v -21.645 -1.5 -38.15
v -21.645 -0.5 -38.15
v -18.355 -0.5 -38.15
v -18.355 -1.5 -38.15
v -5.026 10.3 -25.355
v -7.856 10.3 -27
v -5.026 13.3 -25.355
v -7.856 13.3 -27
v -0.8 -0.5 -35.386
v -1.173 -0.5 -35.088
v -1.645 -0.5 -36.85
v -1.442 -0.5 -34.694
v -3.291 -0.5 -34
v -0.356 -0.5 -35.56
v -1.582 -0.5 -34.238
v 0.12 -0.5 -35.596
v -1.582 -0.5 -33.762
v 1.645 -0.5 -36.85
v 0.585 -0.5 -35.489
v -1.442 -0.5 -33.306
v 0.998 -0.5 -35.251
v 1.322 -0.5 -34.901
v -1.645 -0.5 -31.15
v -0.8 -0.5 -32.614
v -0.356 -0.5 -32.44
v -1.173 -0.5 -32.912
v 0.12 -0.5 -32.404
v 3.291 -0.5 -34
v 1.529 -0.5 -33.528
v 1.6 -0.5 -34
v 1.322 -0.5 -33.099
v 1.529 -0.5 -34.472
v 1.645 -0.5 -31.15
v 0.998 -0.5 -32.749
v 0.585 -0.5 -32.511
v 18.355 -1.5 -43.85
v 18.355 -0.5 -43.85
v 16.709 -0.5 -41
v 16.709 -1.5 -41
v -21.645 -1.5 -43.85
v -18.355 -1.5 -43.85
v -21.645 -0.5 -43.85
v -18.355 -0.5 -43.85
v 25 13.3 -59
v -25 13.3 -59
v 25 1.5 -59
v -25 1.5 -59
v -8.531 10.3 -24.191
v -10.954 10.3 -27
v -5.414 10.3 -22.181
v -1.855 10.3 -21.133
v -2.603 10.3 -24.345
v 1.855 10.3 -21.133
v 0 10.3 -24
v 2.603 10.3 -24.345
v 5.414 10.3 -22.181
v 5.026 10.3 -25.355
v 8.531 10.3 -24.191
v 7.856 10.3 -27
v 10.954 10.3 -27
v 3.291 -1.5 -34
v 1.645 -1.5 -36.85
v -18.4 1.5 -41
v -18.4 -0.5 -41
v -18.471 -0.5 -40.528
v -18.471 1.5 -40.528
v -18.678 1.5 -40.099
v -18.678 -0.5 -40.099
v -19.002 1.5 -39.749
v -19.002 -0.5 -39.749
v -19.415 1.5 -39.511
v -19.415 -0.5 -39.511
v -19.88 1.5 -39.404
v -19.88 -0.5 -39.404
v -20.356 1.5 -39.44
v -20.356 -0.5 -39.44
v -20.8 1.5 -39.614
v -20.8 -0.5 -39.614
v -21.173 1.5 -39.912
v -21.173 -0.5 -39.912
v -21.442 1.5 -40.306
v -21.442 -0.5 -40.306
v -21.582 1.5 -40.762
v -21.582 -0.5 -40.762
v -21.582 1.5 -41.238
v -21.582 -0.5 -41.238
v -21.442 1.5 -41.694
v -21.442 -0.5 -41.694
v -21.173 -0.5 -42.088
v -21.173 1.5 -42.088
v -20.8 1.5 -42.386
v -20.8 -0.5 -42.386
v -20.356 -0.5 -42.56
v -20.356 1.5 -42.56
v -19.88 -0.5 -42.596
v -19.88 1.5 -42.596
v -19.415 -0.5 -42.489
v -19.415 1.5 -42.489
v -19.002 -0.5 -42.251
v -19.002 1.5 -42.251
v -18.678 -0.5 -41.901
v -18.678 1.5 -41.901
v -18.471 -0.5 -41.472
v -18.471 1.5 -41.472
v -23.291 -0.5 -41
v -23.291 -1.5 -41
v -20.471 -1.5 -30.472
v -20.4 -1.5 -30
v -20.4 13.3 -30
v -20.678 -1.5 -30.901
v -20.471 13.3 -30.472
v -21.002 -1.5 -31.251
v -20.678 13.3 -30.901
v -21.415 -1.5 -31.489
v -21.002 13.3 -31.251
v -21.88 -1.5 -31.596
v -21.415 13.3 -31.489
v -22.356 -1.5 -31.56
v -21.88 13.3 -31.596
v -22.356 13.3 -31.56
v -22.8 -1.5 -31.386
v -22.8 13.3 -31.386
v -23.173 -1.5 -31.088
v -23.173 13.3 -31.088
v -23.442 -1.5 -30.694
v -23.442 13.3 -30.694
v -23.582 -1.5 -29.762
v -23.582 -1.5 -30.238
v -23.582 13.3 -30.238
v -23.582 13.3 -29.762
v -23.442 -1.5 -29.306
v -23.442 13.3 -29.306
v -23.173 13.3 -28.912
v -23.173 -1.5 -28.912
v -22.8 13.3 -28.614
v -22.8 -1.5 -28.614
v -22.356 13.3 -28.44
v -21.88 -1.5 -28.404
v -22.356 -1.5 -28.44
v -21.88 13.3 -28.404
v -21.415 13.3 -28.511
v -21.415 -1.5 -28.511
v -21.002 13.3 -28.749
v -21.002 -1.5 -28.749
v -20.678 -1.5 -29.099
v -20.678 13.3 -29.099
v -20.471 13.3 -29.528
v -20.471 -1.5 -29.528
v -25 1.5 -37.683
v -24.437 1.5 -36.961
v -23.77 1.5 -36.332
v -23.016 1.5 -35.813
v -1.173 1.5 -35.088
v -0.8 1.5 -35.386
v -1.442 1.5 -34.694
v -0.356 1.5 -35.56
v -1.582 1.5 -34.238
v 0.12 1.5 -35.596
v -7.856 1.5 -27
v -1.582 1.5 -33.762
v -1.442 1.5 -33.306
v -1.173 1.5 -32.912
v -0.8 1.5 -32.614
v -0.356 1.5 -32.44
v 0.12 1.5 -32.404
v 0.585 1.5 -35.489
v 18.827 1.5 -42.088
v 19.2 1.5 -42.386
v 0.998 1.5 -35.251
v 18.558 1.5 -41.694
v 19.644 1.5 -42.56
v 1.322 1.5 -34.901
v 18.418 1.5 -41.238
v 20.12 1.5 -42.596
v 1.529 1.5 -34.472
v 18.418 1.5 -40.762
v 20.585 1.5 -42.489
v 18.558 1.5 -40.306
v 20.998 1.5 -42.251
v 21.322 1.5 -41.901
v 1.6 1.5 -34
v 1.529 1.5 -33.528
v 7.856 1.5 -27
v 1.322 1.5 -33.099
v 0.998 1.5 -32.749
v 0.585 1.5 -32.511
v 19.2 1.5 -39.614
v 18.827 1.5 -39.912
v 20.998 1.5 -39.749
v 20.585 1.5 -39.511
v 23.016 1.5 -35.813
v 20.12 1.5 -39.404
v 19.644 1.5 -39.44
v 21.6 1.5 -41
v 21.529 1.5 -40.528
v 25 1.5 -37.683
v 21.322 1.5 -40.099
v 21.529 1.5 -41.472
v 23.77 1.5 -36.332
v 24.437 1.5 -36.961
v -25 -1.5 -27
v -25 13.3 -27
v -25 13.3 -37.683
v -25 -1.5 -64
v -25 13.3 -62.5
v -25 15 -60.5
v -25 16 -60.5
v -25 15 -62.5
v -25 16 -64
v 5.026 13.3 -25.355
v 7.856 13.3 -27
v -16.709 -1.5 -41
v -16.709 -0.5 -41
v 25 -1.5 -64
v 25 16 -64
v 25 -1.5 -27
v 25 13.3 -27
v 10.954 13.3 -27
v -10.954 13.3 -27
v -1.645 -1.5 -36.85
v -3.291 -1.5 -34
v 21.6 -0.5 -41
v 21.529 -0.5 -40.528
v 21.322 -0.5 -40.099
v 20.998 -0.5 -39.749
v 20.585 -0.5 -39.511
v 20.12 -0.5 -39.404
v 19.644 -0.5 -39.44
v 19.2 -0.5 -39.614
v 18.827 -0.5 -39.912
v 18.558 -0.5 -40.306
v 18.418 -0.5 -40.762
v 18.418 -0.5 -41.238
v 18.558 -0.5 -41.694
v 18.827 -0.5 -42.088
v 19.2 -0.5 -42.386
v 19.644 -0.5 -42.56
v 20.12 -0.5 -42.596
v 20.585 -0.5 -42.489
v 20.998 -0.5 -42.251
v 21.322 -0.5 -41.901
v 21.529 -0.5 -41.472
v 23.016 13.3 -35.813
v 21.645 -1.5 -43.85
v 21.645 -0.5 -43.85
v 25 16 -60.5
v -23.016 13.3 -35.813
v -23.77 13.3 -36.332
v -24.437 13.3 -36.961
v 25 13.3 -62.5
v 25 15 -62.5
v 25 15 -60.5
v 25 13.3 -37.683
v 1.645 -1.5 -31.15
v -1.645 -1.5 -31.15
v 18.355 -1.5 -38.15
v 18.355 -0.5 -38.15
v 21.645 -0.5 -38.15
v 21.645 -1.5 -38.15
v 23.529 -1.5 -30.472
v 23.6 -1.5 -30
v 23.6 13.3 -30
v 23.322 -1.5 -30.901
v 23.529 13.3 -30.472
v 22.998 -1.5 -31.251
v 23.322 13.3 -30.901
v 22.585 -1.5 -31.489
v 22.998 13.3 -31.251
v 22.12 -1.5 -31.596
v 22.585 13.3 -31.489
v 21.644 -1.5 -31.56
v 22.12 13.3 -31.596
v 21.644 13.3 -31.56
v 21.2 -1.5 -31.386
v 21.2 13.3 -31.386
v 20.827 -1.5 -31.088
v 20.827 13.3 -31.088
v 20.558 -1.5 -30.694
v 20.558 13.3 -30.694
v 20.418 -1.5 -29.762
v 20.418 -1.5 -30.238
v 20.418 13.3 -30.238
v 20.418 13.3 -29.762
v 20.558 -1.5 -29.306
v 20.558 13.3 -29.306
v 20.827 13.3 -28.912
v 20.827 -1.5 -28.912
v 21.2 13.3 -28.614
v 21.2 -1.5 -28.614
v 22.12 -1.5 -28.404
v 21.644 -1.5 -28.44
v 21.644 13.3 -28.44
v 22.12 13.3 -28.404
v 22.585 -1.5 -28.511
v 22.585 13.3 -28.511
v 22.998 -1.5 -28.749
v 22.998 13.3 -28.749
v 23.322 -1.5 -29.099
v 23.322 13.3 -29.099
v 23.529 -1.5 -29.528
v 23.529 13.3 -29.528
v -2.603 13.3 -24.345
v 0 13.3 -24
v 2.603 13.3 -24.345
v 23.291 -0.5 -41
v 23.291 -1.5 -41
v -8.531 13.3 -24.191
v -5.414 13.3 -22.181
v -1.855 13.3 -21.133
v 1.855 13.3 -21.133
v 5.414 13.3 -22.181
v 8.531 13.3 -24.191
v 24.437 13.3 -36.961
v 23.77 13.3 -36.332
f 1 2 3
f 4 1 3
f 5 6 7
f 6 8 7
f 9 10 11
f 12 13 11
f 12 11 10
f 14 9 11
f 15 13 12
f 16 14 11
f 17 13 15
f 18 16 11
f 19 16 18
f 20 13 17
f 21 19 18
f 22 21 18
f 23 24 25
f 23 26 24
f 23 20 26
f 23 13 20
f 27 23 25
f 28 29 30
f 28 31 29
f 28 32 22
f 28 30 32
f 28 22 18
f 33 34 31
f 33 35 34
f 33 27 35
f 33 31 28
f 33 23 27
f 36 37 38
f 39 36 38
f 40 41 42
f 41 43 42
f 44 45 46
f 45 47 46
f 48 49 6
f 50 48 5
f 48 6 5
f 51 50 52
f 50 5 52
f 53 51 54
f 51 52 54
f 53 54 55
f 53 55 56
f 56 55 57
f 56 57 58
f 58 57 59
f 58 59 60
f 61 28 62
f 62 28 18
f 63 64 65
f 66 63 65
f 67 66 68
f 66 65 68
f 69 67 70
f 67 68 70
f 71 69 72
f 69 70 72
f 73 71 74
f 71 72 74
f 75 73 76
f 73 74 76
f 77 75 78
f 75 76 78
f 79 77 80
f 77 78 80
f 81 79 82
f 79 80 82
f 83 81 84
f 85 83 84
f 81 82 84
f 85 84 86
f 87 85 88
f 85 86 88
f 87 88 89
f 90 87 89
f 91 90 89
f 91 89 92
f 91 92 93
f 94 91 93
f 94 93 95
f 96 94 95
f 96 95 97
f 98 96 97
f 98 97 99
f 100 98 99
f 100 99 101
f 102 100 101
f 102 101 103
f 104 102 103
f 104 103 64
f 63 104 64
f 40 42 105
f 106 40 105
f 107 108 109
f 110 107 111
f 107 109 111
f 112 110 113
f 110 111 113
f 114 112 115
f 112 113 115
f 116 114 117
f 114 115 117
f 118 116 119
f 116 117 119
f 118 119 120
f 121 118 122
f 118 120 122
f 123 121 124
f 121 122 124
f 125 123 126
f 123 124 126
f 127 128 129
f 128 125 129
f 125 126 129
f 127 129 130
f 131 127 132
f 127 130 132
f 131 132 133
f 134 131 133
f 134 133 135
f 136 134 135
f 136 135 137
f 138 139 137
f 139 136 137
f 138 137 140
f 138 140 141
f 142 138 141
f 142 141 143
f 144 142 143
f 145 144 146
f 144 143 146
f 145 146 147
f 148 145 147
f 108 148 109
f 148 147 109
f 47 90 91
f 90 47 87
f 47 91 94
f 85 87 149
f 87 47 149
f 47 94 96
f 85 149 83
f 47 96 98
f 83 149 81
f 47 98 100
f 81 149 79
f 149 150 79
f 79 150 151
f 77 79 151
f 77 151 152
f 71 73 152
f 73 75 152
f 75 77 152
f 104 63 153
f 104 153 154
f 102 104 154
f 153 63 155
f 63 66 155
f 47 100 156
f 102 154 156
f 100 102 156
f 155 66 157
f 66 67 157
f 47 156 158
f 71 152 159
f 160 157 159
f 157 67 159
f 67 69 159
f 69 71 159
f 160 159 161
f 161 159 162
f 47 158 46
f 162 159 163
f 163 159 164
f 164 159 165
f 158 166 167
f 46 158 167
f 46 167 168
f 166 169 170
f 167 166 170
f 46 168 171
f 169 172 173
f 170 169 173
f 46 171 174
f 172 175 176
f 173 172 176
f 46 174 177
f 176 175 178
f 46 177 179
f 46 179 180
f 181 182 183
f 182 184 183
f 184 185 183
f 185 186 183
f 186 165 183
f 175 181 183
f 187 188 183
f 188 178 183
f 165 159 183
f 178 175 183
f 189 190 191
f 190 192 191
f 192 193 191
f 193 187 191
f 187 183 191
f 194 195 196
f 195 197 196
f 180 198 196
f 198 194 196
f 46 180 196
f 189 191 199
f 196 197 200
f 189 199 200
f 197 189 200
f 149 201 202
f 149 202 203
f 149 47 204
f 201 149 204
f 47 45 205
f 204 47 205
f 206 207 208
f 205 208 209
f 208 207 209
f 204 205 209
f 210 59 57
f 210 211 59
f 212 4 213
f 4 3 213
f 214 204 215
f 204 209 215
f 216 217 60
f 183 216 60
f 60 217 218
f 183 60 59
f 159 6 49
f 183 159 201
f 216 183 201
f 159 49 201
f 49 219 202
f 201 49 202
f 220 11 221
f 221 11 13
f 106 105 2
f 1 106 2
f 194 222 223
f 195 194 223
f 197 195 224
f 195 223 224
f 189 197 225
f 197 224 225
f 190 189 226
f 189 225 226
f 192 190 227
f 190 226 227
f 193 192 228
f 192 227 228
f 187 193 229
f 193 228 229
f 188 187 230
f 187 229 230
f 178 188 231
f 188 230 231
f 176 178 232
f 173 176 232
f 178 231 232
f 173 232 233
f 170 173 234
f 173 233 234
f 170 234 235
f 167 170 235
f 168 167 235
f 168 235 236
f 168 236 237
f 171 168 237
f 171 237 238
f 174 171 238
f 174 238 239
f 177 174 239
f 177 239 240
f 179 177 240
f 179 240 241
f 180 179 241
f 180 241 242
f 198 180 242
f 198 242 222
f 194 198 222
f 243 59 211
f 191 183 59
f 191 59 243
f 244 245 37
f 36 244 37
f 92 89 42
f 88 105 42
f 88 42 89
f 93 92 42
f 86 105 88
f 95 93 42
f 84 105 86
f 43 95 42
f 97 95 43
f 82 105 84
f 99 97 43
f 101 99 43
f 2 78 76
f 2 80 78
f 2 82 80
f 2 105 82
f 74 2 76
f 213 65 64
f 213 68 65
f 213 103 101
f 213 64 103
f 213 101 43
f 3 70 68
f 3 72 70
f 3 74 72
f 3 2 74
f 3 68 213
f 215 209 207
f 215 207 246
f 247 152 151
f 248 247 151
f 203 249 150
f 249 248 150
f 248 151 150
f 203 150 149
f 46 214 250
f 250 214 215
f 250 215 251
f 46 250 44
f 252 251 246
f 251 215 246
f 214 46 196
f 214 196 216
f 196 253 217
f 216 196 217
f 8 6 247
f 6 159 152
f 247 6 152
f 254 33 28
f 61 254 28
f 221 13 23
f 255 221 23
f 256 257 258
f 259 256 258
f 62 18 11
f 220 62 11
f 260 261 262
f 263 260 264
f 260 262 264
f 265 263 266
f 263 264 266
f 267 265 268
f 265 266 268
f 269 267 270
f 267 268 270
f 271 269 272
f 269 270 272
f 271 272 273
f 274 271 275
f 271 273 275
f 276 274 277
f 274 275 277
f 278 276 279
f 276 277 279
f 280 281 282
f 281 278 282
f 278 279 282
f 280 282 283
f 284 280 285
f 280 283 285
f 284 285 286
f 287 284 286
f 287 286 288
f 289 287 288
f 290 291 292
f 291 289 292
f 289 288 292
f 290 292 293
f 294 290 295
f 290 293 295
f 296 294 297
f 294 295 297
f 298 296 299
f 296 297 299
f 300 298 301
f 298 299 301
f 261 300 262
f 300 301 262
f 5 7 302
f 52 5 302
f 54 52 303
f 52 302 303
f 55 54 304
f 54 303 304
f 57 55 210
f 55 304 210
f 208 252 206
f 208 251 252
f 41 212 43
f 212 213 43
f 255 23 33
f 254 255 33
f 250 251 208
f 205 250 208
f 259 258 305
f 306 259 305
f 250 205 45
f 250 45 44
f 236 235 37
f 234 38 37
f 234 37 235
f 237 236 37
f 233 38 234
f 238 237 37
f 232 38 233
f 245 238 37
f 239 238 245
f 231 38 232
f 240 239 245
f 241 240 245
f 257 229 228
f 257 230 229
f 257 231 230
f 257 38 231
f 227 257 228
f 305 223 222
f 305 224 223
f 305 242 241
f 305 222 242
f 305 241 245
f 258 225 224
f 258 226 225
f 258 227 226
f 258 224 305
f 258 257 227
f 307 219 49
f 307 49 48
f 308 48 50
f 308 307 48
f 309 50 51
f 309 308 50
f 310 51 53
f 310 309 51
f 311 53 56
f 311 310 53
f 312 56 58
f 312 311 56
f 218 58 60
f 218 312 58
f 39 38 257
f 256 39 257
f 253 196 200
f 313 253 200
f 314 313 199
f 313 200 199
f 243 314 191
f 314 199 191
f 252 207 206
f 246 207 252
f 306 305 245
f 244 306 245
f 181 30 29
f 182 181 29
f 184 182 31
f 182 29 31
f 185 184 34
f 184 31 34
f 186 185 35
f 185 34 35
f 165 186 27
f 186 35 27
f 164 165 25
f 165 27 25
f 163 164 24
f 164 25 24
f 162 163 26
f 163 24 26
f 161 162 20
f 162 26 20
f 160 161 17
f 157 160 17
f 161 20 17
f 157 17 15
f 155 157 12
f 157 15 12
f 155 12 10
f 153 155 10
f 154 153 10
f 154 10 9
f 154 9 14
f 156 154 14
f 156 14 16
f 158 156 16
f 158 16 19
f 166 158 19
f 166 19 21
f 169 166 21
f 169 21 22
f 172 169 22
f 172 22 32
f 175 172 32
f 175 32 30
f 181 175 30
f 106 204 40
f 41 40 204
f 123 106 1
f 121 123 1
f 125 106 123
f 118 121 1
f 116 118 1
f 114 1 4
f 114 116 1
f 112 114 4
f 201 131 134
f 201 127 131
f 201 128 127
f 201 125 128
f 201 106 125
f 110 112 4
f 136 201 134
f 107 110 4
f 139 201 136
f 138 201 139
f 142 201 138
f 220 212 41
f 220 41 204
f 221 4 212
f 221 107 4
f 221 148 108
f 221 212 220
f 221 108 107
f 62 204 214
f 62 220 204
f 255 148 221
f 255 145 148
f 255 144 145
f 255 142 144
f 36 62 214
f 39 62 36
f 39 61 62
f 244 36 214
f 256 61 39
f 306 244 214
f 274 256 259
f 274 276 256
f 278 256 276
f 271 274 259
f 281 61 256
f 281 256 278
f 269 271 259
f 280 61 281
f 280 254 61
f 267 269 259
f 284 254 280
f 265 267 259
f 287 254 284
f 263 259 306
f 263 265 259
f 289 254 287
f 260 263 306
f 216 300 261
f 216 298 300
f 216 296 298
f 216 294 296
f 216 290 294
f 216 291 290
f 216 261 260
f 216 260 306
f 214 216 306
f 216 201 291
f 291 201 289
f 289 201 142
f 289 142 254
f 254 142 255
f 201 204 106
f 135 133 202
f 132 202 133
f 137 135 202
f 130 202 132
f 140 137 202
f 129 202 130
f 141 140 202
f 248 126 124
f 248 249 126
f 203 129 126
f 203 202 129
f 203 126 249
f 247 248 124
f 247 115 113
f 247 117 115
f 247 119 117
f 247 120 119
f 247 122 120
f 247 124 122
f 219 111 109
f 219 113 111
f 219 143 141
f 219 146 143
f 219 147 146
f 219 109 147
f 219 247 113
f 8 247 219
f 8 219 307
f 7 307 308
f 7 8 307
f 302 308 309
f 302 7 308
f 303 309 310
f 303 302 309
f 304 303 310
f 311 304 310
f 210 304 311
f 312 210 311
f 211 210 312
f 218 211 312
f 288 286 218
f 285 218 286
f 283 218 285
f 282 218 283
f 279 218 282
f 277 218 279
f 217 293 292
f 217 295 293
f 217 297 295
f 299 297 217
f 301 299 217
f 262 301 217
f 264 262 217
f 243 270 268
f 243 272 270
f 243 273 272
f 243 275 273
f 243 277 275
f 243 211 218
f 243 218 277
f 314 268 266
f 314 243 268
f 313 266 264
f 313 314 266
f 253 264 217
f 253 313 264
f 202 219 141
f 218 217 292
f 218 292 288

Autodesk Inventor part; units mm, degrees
ref_plane "YZ Plane" through (0, 0, 0) normal (1, 0, 0) x (0, 1, 0)
ref_plane "XZ Plane" through (0, 0, 0) normal (0, 1, 0) x (-1, 0, 0)
ref_plane "XY Plane" through (0, 0, 0) normal (0, 0, 1) x (1, 0, 0)
sketch "スケッチ1" plane through (0, 0, 0) normal (0, 1, 0) x (-1, 0, 0)
  line L0 (75, 0) -> (105, -51.9615)
  line L1 (-75, 0) -> (-105, -51.9615)
  line L2 (0, -218.2384) -> (0, 36.3731)
  line L3 (147, 0) -> (-147, 0)
  line L4 (105, -51.9615) -> (30, -181.8653)
  line L5 (30, -181.8653) -> (-30, -181.8653)
  line L6 (-30, -181.8653) -> (-105, -51.9615)
  line L7 (75, 0) -> (-75, 0)
  line L8 (34, 0) -> (34, -24.3509)
  line L9 (34, -24.3509) -> (48.7058, -49.822)
  line L10 (48.7058, -49.822) -> (90, -25.9808)
  line L11 (45, 0) -> (45, -18) construction
  line L12 (45, -18) -> (34, -24.3509) construction
  line L13 (84.5, -87.4686) -> (63.4115, -75.2931)
  line L14 (63.4115, -75.2931) -> (48.7058, -49.822)
  line L15 (-34, 0) -> (-34, -24.3509)
  line L16 (-34, -24.3509) -> (-48.7058, -49.822)
  line L17 (-63.4115, -75.2931) -> (-48.7058, -49.822)
  line L18 (-84.5, -87.4686) -> (-63.4115, -75.2931)
  circle A0 centre (30, -32.75) radius 1.6
  circle A1 centre (-30, -32.75) radius 1.6
  line L19 (35.5295, -27) -> (-35.5295, -27)
  point P0 (0, 0)
  point P1 (0, 0)
  point P2 (0, -27)
  dimension "d1" = 150
  dimension "d2" = 60
  dimension "d3" = 60
  dimension "d6" = 60
  dimension "d30" = 60
  dimension "d31" = 18
  dimension "d32" = 30
  dimension "d33" = 41
  dimension "d34" = 3.2
  dimension "d35" = 30
  dimension "d36" = 32.75
  dimension "d37" = 27
extrude "プレート1" add sketch "スケッチ1" along normal blind 1.5 contours L14 L13 L4 L5 L2 L19 L9 | L2 L5 L6 L18 L17 L16 L19
sketch "スケッチ4" plane through (0, 1.5, 0) normal (0, 1, 0) x (1, 0, 0)
  circle A0 centre (30, 67.8013) radius 1.6 projected
  circle A1 centre (45, 67.8013) radius 1.6 projected
  line L0 (0, 218.2384) -> (0, -36.3731) projected
  circle A2 centre (-30, 67.8013) radius 1.6
  circle A3 centre (-45, 67.8013) radius 1.6
  line L1 (61.6173, 73.1025) -> (25, 73.1025) projected
  line L2 (25, 73.1025) -> (25, 62.5) projected
  line L3 (-61.6173, 73.1025) -> (-25, 73.1025) projected
  line L4 (-25, 73.1025) -> (-25, 62.5) projected
  line L5 (-25, 62.5) -> (25, 62.5)
  line L6 (-30, 73.1025) -> (30, 73.1025)
  line L7 (30, 73.1025) -> (30, 181.8653)
  line L8 (30, 181.8653) -> (-30, 181.8653)
  line L9 (-30, 181.8653) -> (-30, 73.1025)
  line L10 (-25, 62.5) -> (25, 62.5)
  line L11 (25, 62.5) -> (25, 73.1025)
  line L12 (25, 73.1025) -> (-25, 73.1025)
  line L13 (-25, 73.1025) -> (-25, 62.5)
  line L14 (30, 181.8653) -> (84.5, 87.4686) projected
  line L15 (70, 112.5833) -> (30, 89.4893)
  line L16 (-30, 89.4893) -> (-70, 112.5833)
  line L17 (-84.5, 87.4686) -> (-30, 181.8653) projected
  line L18 (84.5, 87.4686) -> (63.4115, 75.2931) projected
  line L19 (-63.4115, 75.2931) -> (-84.5, 87.4686) projected
  line L20 (-35.5295, 27) -> (-63.4115, 75.2931) projected
  point P0 (0, 0)
  dimension "d40" = 80
extrude "切り取り3" cut sketch "スケッチ4" against normal blind 1.5
sketch "スケッチ5" plane through (0, 1.5, 0) normal (0, 1, 0) x (1, 0, 0)
  line L0 (-75, 44) -> (75, 44) projected
  circle A0 centre (-20, 41) radius 3
  circle A1 centre (20, 41) radius 3
  line L1 (-25, 62.5) -> (25, 62.5) projected
  line L2 (0, 62.5) -> (0, 27)
  line L3 (35.5295, 27) -> (-35.5295, 27) projected
  circle A2 centre (-20, 41) radius 1.6
  circle A3 centre (20, 41) radius 1.6
  circle A4 centre (0, 34) radius 1.6
  point P0 (0, 0)
  dimension "d41" = 6
  dimension "d42" = 6
  dimension "d43" = 40
  dimension "d44" = 3.2
  dimension "d45" = 3.2
  dimension "d46" = 3.2
  dimension "d47" = 7
extrude "切り取り4" cut sketch "スケッチ5" against normal blind 1.5 contours A4 L2 | L2 A4 | A2 | A3
sketch "スケッチ6" plane through (0, 1.5, 0) normal (0, 1, 0) x (1, 0, 0)
  circle A0 centre (-20, 41) radius 1.6 projected
  circle A1 centre (20, 41) radius 1.6 projected
  circle A2 centre (-20, 41) radius 3
  circle A3 centre (20, 41) radius 3
  line L0 (-70.724, 59) -> (85.6586, 59)
  line L1 (85.6586, 59) -> (85.6586, 44)
  line L2 (85.6586, 44) -> (-70.724, 44)
  line L3 (-70.724, 44) -> (-70.724, 59)
  circle A4 centre (0, 34) radius 1.6 projected
  circle A5 centre (0, 34) radius 10
  circle A6 centre (-20, 41) radius 6
  circle A7 centre (20, 41) radius 6
  line L4 (-5.0258, 25.3547) -> (-23.0155, 35.8128)
  line L5 (5.0258, 25.3547) -> (23.0155, 35.8128)
  line L6 (35.5295, 27) -> (-35.5295, 27) projected
  line L7 (-25, 27) -> (-25, 44)
  line L8 (25, 27) -> (25, 44)
  circle A8 centre (-30, 32.75) radius 1.6 projected
  circle A9 centre (30, 32.75) radius 1.6 projected
  line L9 (-25, 73.1025) -> (-25, 62.5) projected
  line L10 (-25, 62.5) -> (-25, 59)
  line L11 (-25, 62.5) -> (25, 62.5) projected
  line L12 (25, 62.5) -> (25, 59)
  point P0 (0, 0)
  point P1 (25, 37.6834)
  point P2 (7.856, 27)
  point P3 (-25, 37.6834)
  point P4 (-7.856, 27)
  dimension "d52" = 12
  dimension "d53" = 12
  dimension "d50" = 6
  dimension "d51" = 15
  dimension "d54" = 5
  dimension "d55" = 5
extrude "押し出し1" add sketch "スケッチ6" along normal blind 11.8 contours A6 L4 L6 L7 | A7 L8 L6 L5 | L10 L11 L12 L0
sketch "スケッチ7" plane through (0, 1.5, 0) normal (0, 1, 0) x (1, 0, 0)
  line L0 (-176.5784, 180.8905) -> (313.8631, 180.8905)
  line L1 (313.8631, 180.8905) -> (313.8631, -72.7571)
  line L2 (313.8631, -72.7571) -> (-176.5784, -72.7571)
  line L3 (-176.5784, -72.7571) -> (-176.5784, 180.8905)
  point P0 (0, 0)
extrude "押し出し2" cut sketch "スケッチ7" against normal through all
sketch "スケッチ8" plane through (25, 13.3, -62.5) normal (0, 0, -1) x (-1, 0, 0)
  line L0 (0, -11.8) -> (50, -11.8) projected
  line L1 (0, -11.8) -> (50, -11.8)
  line L2 (50, -11.8) -> (50, 2.7)
  line L3 (50, 2.7) -> (0, 2.7)
  line L4 (0, 2.7) -> (0, -11.8)
  line L5 (50, -11.8) -> (50, 0) projected
  line L6 (0, 0) -> (50, 0) projected
  point P0 (25, -13.3)
  dimension "d60" = 2.7
extrude "押し出し3" add sketch "スケッチ8" along normal blind 1.5
sketch "スケッチ9" plane through (25, 13.3, -62.5) normal (0, 0, 1) x (1, 0, 0)
  line L0 (-50, 0) -> (-50, 2.7) projected
  line L1 (-50, 2.7) -> (0, 2.7)
  line L2 (0, 2.7) -> (0, 1.7)
  line L3 (0, 1.7) -> (-50, 1.7)
  line L4 (-50, 1.7) -> (-50, 2.7)
  line L5 (0, 2.7) -> (0, 0) projected
  point P0 (-25, -13.3)
  dimension "d63" = 1
extrude "押し出し4" add sketch "スケッチ9" along normal blind 2
sketch "スケッチ11" plane through (0, 13.3, 0) normal (0, 1, 0) x (1, 0, 0)
  line L0 (-7.856, 27) -> (-23.0155, 35.8128) projected
  line L1 (23.0155, 35.8128) -> (7.856, 27) projected
  circle A0 centre (0, 34) radius 10
  circle A1 centre (0, 34) radius 13
  line L2 (-7.856, 27) -> (-5.0258, 25.3547)
  line L3 (7.856, 27) -> (5.0258, 25.3547)
  point P0 (0, 0)
  point P1 (-12.2072, 29.5295)
  point P2 (12.2072, 29.5295)
  dimension "d66" = 20
  dimension "d67" = 26
extrude "押し出し5" add sketch "スケッチ11" against normal blind 3 contours L2 A0 L3 L1 A1 L0 picked at (-6.6023, 24.0668)
sketch "スケッチ12" plane through (0, 13.3, 0) normal (0, 1, 0) x (1, 0, 0)
  circle A0 centre (-22, 30) radius 1.6
  circle A1 centre (22, 30) radius 1.6
  line L0 (25, 60.5) -> (-25, 60.5) projected
  line L1 (0, 60.5) -> (0, 48.3991)
  line L2 (-25, 27) -> (-10.9545, 27) projected
  line L3 (-25, 37.6834) -> (-25, 27) projected
  point P0 (0, 0)
  dimension "d70" = 3.2
  dimension "d71" = 3
  dimension "d72" = 3
extrude "押し出し6" cut sketch "スケッチ12" against normal through all
sketch "スケッチ13" plane through (0, 1.5, 0) normal (0, -1, 0) x (1, 0, 0)
  line L0 (-25, -37.6834) -> (-25, -27) projected
  line L1 (-25, -27) -> (25, -27)
  line L2 (25, -27) -> (25, -64)
  line L3 (25, -64) -> (-25, -64)
  line L4 (-25, -64) -> (-25, -27)
  circle A0 centre (-22, -30) radius 1.6 projected
  circle A1 centre (22, -30) radius 1.6 projected
  point P0 (0, 0)
extrude "押し出し7" add sketch "スケッチ13" along normal blind 2
sketch "スケッチ14" plane through (0, -0.5, 0) normal (0, -1, 0) x (1, 0, 0)
  circle A0 centre (-20, -41) radius 1.6 projected
  circle A1 centre (0, -34) radius 1.6 projected
  circle A2 centre (20, -41) radius 1.6 projected
  line L0 (-30, -73.9008) -> (-76.75, -100.892) projected
  line L1 (-84.5, -87.4686) -> (-76.75, -100.892) projected
  line L2 (-63.4115, -75.2931) -> (-84.5, -87.4686) projected
  line L3 (-35.5295, -27) -> (-63.4115, -75.2931) projected
  line L4 (35.5295, -27) -> (-35.5295, -27) projected
  line L5 (63.4115, -75.2931) -> (35.5295, -27) projected
  line L6 (84.5, -87.4686) -> (63.4115, -75.2931) projected
  line L7 (76.75, -100.892) -> (84.5, -87.4686) projected
  line L8 (76.75, -100.892) -> (30, -73.9008) projected
  line L9 (30, -73.9008) -> (30, -73.1025) projected
  line L10 (30, -73.1025) -> (25, -73.1025) projected
  line L11 (25, -73.1025) -> (25, -62.5) projected
  line L12 (25, -62.5) -> (-25, -62.5) projected
  line L13 (-25, -62.5) -> (-25, -73.1025) projected
  line L14 (-25, -73.1025) -> (-30, -73.1025) projected
  line L15 (-30, -73.1025) -> (-30, -73.9008) projected
  circle A3 centre (-30, -67.8013) radius 1.6 projected
  circle A4 centre (30, -67.8013) radius 1.6 projected
  circle A5 centre (45, -67.8013) radius 1.6 projected
  circle A6 centre (-45, -67.8013) radius 1.6 projected
  circle A7 centre (30, -32.75) radius 1.6 projected
  circle A8 centre (-30, -32.75) radius 1.6 projected
  circle A9 centre (48.4391, -79.9279) radius 1.6 projected
  circle A10 centre (-48.4391, -79.9279) radius 1.6 projected
  circle A11 centre (-73.3666, -93.1522) radius 1.6 projected
  circle A12 centre (73.3666, -93.1522) radius 1.6 projected
  point P0 (0, 0)
extrude "押し出し8" cut sketch "スケッチ14" against normal through all contours A0 | A1 | A2
sketch "スケッチ15" plane through (0, -0.5, 0) normal (0, -1, 0) x (1, 0, 0)
  line L0 (3.2909, -34) -> (1.6454, -36.85)
  line L1 (1.6454, -36.85) -> (-1.6454, -36.85)
  line L2 (-1.6454, -36.85) -> (-3.2909, -34)
  line L3 (-3.2909, -34) -> (-1.6454, -31.15)
  line L4 (-1.6454, -31.15) -> (1.6454, -31.15)
  line L5 (1.6454, -31.15) -> (3.2909, -34)
  line L6 (21.6454, -43.85) -> (18.3546, -43.85)
  line L7 (18.3546, -43.85) -> (16.7091, -41)
  line L8 (16.7091, -41) -> (18.3546, -38.15)
  line L9 (18.3546, -38.15) -> (21.6454, -38.15)
  line L10 (21.6454, -38.15) -> (23.2909, -41)
  line L11 (23.2909, -41) -> (21.6454, -43.85)
  line L12 (-16.7091, -41) -> (-18.3546, -43.85)
  line L13 (-18.3546, -43.85) -> (-21.6454, -43.85)
  line L14 (-21.6454, -43.85) -> (-23.2909, -41)
  line L15 (-23.2909, -41) -> (-21.6454, -38.15)
  line L16 (-21.6454, -38.15) -> (-18.3546, -38.15)
  line L17 (-18.3546, -38.15) -> (-16.7091, -41)
  circle A0 centre (-20, -41) radius 1.6 projected
  circle A1 centre (0, -34) radius 1.6 projected
  circle A2 centre (20, -41) radius 1.6 projected
  circle A3 centre (20, -41) radius 1.6 projected
  circle A4 centre (0, -34) radius 1.6 projected
  circle A5 centre (-20, -41) radius 1.6 projected
  line L18 (25, -64) -> (25, -27) projected
  line L19 (25, -27) -> (-25, -27) projected
  line L20 (-25, -27) -> (-25, -64) projected
  line L21 (-25, -64) -> (25, -64) projected
  circle A6 centre (-22, -30) radius 1.6 projected
  circle A7 centre (22, -30) radius 1.6 projected
  point P0 (0, 0)
  point P1 (0, -34)
  point P2 (20, -41)
  point P3 (-20, -41)
  dimension "d80" = 5.7
extrude "押し出し9" add sketch "スケッチ15" along normal blind 1 contours L21 L20 L19 L18
equation "\"d3\" = d2"
equation "\"d38\" = Thickness"
equation "\"d41\" = d42"
equation "\"d48\" = Thickness"
equation "\"d16\" = Thickness"
equation "\"BendRadius\" = Thickness"
equation "\"BendReliefWidth\" = Thickness"
equation "\"BendReliefDepth\" = 0.5 * Thickness"
equation "\"CornerReliefSize\" = 4 * Thickness"
equation "\"MinimumRemnant\" = 2 * Thickness"
equation "\"TransitionRadius\" = BendRadius"
equation "\"JacobiRadiusSize\" = BendRadius"
equation "\"GapSize\" = Thickness"
equation "\"Thickness\" = 1.5"
properties part number "belt_cover_middle"
